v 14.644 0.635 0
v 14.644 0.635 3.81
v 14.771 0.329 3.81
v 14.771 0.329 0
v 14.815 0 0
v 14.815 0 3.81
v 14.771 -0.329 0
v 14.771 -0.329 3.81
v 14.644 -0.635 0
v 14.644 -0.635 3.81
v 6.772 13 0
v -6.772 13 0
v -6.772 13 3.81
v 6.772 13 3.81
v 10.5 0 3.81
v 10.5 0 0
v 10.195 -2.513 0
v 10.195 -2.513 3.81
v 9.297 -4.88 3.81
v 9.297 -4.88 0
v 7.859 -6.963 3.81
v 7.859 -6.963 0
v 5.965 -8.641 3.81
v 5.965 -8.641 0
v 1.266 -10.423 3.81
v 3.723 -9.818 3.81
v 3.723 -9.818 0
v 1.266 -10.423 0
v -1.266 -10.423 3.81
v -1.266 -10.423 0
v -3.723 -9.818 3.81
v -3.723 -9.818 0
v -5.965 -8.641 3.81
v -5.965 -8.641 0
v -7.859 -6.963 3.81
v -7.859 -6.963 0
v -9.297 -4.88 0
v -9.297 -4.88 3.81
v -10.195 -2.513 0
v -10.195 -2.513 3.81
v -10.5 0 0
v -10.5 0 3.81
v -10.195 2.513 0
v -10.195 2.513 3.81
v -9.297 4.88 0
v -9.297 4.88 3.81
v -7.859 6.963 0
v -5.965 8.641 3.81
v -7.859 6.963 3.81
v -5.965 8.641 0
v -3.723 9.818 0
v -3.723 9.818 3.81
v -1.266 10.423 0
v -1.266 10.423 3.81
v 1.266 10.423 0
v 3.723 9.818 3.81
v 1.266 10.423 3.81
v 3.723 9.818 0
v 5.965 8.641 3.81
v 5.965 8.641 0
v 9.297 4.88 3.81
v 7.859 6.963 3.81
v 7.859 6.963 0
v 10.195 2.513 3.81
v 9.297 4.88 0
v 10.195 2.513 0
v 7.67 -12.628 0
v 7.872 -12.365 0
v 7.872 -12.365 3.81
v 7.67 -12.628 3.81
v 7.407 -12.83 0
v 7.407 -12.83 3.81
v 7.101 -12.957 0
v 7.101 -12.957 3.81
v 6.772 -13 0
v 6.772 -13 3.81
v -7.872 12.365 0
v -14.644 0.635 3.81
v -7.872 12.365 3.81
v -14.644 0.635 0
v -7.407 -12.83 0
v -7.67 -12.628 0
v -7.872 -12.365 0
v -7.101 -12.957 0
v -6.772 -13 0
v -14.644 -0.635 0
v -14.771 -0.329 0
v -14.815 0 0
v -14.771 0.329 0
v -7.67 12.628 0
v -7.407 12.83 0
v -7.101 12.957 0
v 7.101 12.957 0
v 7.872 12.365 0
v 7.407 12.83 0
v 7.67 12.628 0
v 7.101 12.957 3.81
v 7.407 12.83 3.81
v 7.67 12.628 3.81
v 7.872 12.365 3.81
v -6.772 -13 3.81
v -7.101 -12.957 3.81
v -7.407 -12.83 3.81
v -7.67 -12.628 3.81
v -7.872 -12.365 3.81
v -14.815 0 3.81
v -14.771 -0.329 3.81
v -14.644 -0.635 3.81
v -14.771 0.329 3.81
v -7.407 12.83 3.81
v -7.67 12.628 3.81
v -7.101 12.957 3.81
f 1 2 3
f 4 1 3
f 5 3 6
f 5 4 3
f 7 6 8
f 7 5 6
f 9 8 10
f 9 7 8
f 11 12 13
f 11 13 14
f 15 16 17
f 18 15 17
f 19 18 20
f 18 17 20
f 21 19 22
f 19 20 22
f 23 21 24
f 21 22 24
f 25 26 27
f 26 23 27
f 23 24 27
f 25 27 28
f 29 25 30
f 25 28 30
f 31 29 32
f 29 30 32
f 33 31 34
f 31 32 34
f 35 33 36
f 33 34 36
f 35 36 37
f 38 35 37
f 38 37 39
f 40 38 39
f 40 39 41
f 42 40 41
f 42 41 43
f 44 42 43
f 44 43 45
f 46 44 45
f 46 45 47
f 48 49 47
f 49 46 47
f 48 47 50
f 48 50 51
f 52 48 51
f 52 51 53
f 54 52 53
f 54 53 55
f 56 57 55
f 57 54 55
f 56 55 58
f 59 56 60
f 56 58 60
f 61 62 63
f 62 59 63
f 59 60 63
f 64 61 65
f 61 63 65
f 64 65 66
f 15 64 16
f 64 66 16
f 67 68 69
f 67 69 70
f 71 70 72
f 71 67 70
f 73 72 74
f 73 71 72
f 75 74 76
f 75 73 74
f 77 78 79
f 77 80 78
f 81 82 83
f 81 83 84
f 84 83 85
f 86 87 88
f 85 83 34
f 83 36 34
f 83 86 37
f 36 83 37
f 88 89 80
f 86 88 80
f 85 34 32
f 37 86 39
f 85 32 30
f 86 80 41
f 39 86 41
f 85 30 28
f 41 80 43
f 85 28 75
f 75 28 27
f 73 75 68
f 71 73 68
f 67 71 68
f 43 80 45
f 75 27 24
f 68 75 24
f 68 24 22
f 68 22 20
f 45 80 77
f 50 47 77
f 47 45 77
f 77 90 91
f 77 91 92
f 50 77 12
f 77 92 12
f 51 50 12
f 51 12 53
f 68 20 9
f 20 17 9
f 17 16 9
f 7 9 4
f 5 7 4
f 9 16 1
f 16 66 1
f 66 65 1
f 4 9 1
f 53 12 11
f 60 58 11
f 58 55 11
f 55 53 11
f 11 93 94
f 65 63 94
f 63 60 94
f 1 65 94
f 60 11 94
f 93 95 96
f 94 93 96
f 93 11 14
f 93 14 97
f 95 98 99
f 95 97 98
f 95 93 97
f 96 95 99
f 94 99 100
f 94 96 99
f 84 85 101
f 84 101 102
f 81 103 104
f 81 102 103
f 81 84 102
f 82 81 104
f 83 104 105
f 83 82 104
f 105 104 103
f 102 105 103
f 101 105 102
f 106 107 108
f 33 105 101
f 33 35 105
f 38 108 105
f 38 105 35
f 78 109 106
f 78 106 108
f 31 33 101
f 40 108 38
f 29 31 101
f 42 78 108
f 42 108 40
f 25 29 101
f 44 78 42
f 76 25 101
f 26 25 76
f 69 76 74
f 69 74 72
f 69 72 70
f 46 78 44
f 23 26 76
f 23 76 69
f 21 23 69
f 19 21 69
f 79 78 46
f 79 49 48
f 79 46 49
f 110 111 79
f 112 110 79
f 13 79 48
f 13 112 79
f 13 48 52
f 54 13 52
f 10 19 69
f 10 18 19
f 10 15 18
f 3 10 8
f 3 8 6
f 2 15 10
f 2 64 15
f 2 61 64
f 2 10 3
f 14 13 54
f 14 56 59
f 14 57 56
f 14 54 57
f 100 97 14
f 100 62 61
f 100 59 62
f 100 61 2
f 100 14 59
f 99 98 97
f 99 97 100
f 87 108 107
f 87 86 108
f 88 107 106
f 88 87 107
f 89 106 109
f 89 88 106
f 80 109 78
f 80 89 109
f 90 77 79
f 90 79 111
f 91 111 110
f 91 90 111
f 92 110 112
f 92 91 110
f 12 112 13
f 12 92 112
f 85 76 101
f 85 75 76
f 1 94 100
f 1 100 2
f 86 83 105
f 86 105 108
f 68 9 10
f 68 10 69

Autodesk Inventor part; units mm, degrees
ref_plane "YZ Plane" through (0, 0, 0) normal (1, 0, 0) x (0, 1, 0)
ref_plane "XZ Plane" through (0, 0, 0) normal (0, 1, 0) x (-1, 0, 0)
ref_plane "XY Plane" through (0, 0, 0) normal (0, 0, 1) x (1, 0, 0)
sketch "Sketch1" plane through (0, 0, 0) normal (0, 0, 1) x (1, 0, 0)
  circle A0 centre (0, 0) radius 10.5
  circle A1 centre (0, 0) radius 13 construction
  line L0 (7.8722, 12.365) -> (14.6445, 0.635)
  line L1 (14.6445, -0.635) -> (7.8722, -12.365)
  line L2 (6.7723, -13) -> (-6.7723, -13)
  line L3 (-7.8722, -12.365) -> (-14.6445, -0.635)
  line L4 (-14.6445, 0.635) -> (-7.8722, 12.365)
  line L5 (-6.7723, 13) -> (6.7723, 13)
  arc A2 (-6.7723, 13) -> (-7.8722, 12.365) centre (-6.7723, 11.73) ccw
  arc A3 (-14.6445, 0.635) -> (-14.6445, -0.635) centre (-13.5446, 0) ccw
  arc A4 (-7.8722, -12.365) -> (-6.7723, -13) centre (-6.7723, -11.73) ccw
  arc A5 (6.7723, -13) -> (7.8722, -12.365) centre (6.7723, -11.73) ccw
  arc A6 (14.6445, -0.635) -> (14.6445, 0.635) centre (13.5446, 0) ccw
  arc A7 (7.8722, 12.365) -> (6.7723, 13) centre (6.7723, 11.73) ccw
  point P0 (0, 13)
  point P1 (7.5056, 13)
  point P2 (15.0111, 0)
  point P3 (7.5056, -13)
  point P4 (-7.5056, -13)
  point P5 (-15.0111, 0)
  point P6 (-7.5056, 13)
  dimension "d1" = 26
  dimension "d0" = 21
  dimension "d2" = 1.27
extrude "Extrusion1" add sketch "Sketch1" along normal blind 3.81
properties part number "connector_nut" material "Lead"
